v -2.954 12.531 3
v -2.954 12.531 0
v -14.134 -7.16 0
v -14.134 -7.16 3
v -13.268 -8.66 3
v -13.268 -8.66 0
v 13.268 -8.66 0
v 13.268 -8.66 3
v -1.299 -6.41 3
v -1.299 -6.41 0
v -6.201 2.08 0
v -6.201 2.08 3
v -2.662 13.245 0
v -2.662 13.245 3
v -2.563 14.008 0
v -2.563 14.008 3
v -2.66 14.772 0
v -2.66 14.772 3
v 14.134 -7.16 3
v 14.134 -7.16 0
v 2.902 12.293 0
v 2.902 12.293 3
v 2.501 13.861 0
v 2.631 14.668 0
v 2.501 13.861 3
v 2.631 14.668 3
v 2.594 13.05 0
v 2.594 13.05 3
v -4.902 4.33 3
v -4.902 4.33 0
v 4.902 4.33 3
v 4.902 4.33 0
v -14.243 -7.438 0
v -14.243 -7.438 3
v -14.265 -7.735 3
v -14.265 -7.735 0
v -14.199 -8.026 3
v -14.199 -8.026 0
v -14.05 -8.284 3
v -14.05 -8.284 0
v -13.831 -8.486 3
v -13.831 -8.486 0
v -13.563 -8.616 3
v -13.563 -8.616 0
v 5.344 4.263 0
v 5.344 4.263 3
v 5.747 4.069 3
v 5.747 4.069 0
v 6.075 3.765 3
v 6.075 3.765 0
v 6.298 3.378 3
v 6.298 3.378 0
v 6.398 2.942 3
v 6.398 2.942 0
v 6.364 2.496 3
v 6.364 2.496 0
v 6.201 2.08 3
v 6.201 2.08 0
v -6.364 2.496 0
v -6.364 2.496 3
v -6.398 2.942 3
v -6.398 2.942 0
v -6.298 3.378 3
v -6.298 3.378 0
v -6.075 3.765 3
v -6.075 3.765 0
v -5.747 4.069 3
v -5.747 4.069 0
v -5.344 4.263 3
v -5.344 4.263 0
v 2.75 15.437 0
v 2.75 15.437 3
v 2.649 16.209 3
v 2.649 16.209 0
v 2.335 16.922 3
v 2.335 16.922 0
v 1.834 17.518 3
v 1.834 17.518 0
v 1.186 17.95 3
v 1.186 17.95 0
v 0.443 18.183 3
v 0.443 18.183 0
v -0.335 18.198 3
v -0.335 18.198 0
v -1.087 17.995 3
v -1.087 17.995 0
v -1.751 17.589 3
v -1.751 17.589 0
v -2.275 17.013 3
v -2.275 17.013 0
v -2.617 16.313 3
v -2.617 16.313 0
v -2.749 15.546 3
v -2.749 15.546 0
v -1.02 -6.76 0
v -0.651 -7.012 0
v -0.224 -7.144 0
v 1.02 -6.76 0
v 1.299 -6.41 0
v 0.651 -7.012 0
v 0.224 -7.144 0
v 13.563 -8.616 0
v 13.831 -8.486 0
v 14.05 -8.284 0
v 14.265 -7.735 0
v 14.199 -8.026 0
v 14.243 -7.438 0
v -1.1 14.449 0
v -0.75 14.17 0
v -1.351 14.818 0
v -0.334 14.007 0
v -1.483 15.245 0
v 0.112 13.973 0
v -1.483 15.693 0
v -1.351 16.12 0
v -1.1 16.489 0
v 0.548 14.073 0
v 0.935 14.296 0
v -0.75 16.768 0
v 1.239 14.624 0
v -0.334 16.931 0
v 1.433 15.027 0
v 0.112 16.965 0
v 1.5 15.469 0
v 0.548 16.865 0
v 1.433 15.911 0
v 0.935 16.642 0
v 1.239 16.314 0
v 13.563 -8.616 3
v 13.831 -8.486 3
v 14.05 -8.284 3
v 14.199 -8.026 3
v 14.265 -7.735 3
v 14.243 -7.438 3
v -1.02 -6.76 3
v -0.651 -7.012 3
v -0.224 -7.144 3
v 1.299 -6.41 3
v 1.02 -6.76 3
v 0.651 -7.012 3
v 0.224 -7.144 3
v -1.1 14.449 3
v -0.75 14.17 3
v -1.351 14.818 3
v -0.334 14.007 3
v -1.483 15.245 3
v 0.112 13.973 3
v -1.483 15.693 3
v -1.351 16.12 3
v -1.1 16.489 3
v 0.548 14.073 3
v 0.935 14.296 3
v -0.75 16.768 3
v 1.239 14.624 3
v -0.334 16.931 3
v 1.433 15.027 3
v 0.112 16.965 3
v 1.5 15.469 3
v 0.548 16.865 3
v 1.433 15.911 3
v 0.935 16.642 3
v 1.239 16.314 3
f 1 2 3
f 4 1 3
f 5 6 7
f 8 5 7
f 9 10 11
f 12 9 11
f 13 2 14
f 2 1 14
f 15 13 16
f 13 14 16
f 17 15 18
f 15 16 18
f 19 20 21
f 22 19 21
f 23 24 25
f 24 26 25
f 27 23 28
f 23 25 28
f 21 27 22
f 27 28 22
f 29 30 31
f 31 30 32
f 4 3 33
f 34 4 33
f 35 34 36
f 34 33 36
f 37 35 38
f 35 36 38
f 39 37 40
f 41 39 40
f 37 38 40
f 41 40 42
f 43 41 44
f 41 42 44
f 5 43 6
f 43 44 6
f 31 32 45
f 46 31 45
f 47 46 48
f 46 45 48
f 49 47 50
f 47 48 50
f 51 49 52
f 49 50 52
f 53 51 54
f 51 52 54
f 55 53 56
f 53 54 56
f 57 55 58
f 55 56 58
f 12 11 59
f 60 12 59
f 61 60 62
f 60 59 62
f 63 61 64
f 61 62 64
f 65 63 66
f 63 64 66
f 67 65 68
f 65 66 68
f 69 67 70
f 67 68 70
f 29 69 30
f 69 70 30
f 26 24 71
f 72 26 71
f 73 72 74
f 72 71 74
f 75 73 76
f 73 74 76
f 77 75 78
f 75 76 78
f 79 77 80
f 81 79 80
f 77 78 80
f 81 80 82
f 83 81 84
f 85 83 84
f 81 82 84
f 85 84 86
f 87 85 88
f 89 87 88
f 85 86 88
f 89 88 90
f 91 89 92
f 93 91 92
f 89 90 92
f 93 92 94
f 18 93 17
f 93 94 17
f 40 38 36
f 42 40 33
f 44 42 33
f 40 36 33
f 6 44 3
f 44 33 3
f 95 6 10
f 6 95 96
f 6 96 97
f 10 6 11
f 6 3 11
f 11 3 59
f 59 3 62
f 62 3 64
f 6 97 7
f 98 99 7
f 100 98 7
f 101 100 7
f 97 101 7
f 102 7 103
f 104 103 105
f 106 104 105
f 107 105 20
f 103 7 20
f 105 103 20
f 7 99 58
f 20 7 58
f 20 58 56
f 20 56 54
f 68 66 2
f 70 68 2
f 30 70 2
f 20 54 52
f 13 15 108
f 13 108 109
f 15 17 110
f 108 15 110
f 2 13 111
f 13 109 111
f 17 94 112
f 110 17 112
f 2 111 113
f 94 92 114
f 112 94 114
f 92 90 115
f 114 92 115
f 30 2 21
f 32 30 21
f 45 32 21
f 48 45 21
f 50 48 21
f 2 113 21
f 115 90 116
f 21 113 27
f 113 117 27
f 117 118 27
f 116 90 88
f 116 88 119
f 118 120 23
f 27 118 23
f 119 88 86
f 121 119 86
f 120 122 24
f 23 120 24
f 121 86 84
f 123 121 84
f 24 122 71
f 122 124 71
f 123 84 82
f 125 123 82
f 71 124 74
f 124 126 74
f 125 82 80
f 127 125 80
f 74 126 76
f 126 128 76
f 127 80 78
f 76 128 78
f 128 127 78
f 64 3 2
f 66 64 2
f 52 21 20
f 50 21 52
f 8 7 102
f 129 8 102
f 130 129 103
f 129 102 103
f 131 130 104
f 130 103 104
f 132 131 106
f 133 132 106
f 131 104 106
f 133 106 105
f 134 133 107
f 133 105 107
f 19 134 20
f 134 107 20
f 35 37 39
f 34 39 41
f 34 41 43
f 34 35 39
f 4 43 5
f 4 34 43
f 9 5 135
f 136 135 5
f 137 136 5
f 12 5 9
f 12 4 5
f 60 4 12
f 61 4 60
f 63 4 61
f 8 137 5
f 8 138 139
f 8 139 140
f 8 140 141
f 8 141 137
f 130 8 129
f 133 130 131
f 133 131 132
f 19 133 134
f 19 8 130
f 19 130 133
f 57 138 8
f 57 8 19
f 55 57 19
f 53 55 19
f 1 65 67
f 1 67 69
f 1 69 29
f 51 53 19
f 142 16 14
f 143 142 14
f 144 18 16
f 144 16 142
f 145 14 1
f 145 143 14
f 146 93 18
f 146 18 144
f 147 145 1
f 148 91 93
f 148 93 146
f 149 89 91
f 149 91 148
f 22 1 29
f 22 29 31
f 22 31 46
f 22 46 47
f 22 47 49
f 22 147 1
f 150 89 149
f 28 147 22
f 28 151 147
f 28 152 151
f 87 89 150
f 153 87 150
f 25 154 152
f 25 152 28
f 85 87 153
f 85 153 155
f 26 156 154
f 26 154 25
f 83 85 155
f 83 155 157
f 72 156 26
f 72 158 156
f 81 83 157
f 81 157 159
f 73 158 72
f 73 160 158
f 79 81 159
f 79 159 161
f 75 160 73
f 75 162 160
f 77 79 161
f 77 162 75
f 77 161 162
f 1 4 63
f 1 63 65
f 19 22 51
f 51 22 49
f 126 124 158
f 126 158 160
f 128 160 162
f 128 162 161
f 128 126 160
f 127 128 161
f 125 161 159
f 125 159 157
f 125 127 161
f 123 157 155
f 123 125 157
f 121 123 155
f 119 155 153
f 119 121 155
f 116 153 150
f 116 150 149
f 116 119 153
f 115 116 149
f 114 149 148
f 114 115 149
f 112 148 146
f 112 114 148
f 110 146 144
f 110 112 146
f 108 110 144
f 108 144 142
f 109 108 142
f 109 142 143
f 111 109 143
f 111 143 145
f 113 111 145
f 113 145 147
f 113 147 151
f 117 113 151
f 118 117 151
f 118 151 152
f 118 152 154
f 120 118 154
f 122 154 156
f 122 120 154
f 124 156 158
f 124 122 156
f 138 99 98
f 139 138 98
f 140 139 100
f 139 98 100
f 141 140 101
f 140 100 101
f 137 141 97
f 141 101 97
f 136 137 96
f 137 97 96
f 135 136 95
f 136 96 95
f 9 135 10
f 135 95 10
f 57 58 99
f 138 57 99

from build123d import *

# Parameters (mm, degrees)
F0_R     = 1.5
F1_DEPTH = 3
F2_R     = 3


# Not quite as in the source:
# - a feature names something its author has since deleted; it is built from what else it names


with BuildPart() as f1:
    # F0 (on Top) → F1 (new body)
    with BuildSketch(Plane.XY):
        with BuildLine():
            ThreePointArc((-14.1339745962, -7.1602540378), (-14.1339745962, -8.1602540378), (-13.2679491924, -8.6602540378))
            Line((-13.2679491924, -8.6602540378), (13.2679491924, -8.6602540378))
            ThreePointArc((13.2679491924, -8.6602540378), (14.1339745962, -8.1602540378), (14.1339745962, -7.1602540378))
            Line((14.1339745962, -7.1602540378), (2.096494358, 13.6892733298))
            ThreePointArc((2.096494358, 13.6892733298), (0.0937033826, 18.2173425378), (-2.2128362603, 13.8361945924))
            Line((-2.2128362603, 13.8361945924), (-14.1339745962, -7.1602540378))
        make_face()
        with BuildLine():
            Line((-4.9019237886, 4.3301270189), (4.9019237886, 4.3301270189))
            ThreePointArc((4.9019237886, 4.3301270189), (6.2009618943, 3.5801270189), (6.2009618943, 2.0801270189))
            Line((6.2009618943, 2.0801270189), (1.2990381057, -6.4102540378))
            ThreePointArc((1.2990381057, -6.4102540378), (0, -7.1602540378), (-1.2990381057, -6.4102540378))
            Line((-1.2990381057, -6.4102540378), (-6.2009618943, 2.0801270189))
            ThreePointArc((-6.2009618943, 2.0801270189), (-6.2009618943, 3.5801270189), (-4.9019237886, 4.3301270189))
        make_face(mode=Mode.SUBTRACT)
        with Locations((0, 15.468939424)):
            Circle(F0_R, mode=Mode.SUBTRACT)
    extrude(amount=F1_DEPTH)

    # F2
    f2_edges = [f1.edges().sort_by_distance(p)[0] for p in [
        (-2.212836, 13.836195, 1.5),
        (2.096494, 13.689273, 1.5),
    ]]
    fillet(f2_edges, radius=F2_R)


solid = f1.part
